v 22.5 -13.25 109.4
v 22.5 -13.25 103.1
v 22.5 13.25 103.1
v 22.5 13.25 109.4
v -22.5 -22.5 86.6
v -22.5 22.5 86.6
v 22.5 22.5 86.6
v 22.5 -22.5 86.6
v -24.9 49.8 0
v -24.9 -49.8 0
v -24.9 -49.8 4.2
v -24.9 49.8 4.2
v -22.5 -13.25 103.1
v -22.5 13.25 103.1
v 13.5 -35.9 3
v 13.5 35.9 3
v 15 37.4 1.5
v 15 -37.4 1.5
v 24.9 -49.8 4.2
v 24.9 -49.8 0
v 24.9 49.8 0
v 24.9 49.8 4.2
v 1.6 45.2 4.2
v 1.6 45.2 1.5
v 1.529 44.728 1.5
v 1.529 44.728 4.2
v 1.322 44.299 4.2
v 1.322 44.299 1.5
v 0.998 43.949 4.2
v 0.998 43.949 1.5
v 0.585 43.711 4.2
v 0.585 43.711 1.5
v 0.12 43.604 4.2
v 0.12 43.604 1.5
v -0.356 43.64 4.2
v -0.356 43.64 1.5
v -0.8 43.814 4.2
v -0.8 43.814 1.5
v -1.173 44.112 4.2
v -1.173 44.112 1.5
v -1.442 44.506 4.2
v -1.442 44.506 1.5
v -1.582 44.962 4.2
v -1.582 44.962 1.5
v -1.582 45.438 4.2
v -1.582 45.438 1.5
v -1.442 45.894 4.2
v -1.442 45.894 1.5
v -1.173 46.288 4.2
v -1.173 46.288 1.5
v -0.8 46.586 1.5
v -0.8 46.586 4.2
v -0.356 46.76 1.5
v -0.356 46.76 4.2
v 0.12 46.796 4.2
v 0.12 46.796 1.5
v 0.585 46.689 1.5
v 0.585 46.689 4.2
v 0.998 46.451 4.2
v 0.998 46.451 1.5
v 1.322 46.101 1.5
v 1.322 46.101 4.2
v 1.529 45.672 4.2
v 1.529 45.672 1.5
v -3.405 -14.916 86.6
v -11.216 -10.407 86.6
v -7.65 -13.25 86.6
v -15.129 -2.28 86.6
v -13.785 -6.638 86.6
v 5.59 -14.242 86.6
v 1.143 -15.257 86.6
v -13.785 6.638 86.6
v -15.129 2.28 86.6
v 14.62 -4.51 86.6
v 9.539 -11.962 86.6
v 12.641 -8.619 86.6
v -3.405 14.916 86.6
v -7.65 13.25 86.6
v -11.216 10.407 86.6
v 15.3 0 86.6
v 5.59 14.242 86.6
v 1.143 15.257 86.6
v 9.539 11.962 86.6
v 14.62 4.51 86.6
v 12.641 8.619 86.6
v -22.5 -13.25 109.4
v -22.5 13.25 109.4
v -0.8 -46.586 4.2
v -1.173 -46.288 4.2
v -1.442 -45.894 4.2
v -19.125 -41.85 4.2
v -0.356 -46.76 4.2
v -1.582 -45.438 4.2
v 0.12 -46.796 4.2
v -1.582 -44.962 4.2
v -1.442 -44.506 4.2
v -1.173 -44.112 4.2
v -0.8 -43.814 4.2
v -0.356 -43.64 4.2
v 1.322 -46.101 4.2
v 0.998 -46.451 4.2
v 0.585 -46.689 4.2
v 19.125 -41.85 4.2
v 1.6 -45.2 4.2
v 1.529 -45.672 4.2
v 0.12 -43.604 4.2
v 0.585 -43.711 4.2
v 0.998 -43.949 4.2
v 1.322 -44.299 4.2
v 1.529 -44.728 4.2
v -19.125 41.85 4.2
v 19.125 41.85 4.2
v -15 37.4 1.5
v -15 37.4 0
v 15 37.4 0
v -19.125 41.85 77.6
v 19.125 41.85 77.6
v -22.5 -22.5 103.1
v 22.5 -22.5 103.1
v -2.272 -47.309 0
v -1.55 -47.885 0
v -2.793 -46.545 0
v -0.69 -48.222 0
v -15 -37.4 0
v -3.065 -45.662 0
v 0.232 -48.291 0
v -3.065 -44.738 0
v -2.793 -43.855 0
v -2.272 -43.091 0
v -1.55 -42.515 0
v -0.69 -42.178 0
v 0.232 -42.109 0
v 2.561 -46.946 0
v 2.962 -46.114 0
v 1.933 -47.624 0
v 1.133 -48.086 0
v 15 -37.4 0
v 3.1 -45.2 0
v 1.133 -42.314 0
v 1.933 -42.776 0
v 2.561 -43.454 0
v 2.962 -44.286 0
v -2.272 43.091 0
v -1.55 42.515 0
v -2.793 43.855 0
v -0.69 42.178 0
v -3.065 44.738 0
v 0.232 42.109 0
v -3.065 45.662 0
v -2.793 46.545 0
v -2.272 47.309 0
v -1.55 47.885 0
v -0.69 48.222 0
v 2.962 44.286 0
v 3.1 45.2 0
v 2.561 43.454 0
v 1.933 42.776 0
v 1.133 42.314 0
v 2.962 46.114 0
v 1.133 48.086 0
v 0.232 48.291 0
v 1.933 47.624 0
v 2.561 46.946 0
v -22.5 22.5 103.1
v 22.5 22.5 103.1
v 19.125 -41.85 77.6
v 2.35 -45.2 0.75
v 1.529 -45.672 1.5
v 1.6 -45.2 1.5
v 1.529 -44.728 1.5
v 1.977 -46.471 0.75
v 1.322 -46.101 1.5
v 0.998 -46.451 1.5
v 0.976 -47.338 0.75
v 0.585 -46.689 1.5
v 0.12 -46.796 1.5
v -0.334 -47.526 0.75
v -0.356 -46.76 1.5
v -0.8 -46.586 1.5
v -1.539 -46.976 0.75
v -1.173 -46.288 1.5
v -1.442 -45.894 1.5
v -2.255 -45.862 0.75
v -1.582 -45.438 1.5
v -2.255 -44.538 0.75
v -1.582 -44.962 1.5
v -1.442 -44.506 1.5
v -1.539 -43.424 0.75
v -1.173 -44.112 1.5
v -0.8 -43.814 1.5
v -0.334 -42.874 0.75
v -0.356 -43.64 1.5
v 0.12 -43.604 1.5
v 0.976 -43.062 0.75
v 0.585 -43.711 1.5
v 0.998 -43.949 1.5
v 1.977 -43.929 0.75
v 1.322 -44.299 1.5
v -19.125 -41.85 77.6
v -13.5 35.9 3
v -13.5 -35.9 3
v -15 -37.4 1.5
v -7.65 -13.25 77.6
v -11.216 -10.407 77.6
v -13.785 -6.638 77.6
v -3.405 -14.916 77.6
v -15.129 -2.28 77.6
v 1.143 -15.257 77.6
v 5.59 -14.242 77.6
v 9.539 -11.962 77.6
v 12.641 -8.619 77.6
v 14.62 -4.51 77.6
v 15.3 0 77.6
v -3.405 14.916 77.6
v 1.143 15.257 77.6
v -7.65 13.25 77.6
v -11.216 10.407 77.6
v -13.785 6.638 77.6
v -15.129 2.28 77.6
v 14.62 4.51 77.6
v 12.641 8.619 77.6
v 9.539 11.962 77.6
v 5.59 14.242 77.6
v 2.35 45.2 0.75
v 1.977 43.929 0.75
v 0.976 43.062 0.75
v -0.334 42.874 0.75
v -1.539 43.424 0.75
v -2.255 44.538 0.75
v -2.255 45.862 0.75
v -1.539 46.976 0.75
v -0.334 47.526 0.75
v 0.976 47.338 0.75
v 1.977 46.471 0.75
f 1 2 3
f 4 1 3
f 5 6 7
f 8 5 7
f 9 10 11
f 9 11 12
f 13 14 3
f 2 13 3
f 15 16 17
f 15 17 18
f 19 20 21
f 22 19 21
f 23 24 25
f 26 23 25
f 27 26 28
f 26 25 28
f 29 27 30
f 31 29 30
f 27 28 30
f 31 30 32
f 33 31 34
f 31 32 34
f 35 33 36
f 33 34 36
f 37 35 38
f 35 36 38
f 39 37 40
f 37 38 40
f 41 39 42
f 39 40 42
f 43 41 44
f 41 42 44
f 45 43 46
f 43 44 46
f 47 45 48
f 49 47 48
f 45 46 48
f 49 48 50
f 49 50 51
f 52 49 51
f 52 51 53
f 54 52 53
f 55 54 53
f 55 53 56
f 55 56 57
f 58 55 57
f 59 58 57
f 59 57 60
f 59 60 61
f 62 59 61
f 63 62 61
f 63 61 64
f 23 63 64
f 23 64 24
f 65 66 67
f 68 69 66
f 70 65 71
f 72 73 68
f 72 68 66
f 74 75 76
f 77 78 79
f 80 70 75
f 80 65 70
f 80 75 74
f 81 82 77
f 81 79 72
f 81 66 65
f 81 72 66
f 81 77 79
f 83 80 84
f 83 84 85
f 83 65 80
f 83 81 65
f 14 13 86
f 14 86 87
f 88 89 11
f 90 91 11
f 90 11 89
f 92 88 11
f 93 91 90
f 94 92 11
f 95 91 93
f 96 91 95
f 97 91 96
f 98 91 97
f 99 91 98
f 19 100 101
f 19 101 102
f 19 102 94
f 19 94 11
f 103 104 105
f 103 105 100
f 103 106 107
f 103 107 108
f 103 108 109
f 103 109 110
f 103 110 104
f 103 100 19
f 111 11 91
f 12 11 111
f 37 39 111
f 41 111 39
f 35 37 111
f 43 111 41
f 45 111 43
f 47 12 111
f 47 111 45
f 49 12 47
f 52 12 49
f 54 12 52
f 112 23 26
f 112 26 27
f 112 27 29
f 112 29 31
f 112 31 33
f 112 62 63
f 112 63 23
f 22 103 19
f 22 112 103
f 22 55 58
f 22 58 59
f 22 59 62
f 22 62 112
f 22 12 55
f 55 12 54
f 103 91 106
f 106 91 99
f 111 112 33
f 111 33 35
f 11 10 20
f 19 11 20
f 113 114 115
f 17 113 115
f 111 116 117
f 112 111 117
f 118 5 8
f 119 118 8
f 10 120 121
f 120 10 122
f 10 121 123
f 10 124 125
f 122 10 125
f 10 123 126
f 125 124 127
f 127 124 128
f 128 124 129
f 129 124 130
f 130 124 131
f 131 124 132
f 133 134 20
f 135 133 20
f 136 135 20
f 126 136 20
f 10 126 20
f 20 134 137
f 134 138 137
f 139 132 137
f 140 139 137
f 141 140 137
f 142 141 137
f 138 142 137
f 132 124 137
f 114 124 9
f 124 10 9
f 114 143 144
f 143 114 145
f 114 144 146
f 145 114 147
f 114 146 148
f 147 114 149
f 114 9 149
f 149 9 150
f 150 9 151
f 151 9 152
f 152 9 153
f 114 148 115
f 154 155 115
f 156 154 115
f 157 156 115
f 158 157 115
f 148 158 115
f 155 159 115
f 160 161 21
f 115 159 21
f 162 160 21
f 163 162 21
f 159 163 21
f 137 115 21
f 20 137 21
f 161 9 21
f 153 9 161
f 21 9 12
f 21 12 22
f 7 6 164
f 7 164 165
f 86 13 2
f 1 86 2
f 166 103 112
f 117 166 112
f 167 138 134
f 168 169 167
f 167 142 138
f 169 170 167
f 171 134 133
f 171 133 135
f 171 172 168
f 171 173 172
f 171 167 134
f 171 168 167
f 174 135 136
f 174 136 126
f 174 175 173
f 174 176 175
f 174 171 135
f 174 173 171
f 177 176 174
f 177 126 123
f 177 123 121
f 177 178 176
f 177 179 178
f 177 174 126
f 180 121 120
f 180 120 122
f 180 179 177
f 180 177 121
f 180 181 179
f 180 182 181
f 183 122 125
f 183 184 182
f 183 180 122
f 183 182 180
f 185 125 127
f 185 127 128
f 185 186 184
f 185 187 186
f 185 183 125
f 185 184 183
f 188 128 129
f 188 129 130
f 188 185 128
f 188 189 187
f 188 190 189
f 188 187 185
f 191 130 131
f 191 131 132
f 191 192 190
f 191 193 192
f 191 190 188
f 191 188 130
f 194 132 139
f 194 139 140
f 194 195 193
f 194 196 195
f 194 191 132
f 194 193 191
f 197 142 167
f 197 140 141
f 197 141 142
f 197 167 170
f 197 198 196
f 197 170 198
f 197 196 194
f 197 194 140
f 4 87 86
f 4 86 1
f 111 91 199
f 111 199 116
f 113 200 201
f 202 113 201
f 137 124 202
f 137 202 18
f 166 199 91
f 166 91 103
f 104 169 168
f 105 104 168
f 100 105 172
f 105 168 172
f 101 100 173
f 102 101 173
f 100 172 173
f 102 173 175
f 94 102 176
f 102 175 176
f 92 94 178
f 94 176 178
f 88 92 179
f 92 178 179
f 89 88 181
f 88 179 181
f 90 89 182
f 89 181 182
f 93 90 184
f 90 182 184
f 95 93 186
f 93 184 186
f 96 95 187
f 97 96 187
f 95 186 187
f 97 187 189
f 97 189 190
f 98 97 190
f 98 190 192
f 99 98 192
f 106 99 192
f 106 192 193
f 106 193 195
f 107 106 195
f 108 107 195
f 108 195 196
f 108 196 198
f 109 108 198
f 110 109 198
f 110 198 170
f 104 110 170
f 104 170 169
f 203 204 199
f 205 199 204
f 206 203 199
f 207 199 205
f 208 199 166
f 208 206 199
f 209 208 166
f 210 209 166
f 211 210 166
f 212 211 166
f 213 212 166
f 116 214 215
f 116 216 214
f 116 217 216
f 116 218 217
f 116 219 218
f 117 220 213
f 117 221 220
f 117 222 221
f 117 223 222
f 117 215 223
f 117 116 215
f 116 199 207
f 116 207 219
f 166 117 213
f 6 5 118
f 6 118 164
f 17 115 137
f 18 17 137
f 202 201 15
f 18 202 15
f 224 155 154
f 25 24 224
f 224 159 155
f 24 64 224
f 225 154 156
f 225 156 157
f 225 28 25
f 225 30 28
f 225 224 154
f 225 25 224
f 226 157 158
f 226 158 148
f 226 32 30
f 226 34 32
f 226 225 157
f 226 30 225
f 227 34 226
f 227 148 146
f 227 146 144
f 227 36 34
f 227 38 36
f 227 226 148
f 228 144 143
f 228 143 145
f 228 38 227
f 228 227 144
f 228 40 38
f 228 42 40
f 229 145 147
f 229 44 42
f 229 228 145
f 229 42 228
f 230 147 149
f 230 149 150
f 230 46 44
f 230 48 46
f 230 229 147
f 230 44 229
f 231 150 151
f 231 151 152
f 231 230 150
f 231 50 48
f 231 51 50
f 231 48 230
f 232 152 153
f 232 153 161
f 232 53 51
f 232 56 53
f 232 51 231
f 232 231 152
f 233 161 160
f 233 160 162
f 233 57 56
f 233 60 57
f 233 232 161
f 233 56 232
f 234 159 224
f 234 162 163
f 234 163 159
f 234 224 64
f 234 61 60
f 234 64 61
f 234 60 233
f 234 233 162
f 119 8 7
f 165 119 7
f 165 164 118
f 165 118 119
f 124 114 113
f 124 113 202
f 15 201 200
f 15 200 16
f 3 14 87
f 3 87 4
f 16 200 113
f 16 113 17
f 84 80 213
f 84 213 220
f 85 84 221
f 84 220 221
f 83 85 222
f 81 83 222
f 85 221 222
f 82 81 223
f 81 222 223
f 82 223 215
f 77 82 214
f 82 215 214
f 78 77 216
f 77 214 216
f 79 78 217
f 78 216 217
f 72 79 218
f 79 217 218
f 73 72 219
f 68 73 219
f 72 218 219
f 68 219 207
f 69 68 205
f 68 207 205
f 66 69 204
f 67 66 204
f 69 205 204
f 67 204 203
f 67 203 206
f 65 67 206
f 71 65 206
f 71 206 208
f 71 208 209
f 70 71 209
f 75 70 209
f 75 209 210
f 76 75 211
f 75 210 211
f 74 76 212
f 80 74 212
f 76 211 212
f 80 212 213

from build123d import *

# Parameters (mm, degrees)
F0_W      = 49.8
F0_H      = 99.6
F1_DEPTH  = 4.2
F2_W      = 38.25
F2_H      = 83.7
F3_DEPTH  = 73.4
F4_R      = 15.3
F5_DEPTH  = 9
F6_W      = 45
F6_H      = 45
F7_DEPTH  = 16.5
F8_W      = 45
F8_H      = 26.5
F9_DEPTH  = 6.3
F10_W     = 30
F10_H     = 74.8
F11_DEPTH = 3
F12_R     = 1.6
F13_DEPTH = 25
F14_SIZE  = 1.5


with BuildPart() as f1:
    # F0 (on Top) → F1 (new body)
    with BuildSketch(Plane.XY):
        Rectangle(F0_W, F0_H)
    extrude(amount=F1_DEPTH)

    # F2 (on face) → F3 (join)
    with BuildSketch(Plane.XY.offset(4.2)):
        Rectangle(F2_W, F2_H)
    extrude(amount=F3_DEPTH)

    # F4 (on face) → F5 (join)
    with BuildSketch(Plane.XY.offset(77.6)):
        Circle(F4_R)
    extrude(amount=F5_DEPTH)

    # F10 (on face) → F11 (cut)
    with BuildSketch(Plane(origin=(0, 0, 0), x_dir=(1, 0, 0), z_dir=(0, 0, -1))):
        Rectangle(F10_W, F10_H)
    extrude(amount=-F11_DEPTH, mode=Mode.SUBTRACT)

    # F12 (on face) → F13 (cut)
    with BuildSketch(Plane(origin=(0, 0, 0), x_dir=(1, 0, 0), z_dir=(0, 0, -1))):
        with Locations((0, -45.2)):
            Circle(F12_R)
        with Locations((0, 45.2)):
            Circle(F12_R)
    extrude(amount=-F13_DEPTH, mode=Mode.SUBTRACT)

    # F14
    f14_edges = [f1.edges().sort_by_distance(p)[0] for p in [
        (-1.6, 45.2, 0),
        (-1.6, -45.2, 0),
        (0, -37.4, 3),
        (-15, 0, 3),
        (0, 37.4, 3),
        (15, 0, 3),
    ]]
    chamfer(f14_edges, length=F14_SIZE)


with BuildPart() as f7:
    # F6 (on face) → F7 (new body)
    with BuildSketch(Plane.XY.offset(86.6)):
        Rectangle(F6_W, F6_H)
    extrude(amount=F7_DEPTH)


with BuildPart() as f9:
    # F8 (on face) → F9 (new body)
    with BuildSketch(Plane.XY.offset(103.1)):
        Rectangle(F8_W, F8_H)
    extrude(amount=F9_DEPTH)


solid = Compound([f1.part, f7.part, f9.part])
